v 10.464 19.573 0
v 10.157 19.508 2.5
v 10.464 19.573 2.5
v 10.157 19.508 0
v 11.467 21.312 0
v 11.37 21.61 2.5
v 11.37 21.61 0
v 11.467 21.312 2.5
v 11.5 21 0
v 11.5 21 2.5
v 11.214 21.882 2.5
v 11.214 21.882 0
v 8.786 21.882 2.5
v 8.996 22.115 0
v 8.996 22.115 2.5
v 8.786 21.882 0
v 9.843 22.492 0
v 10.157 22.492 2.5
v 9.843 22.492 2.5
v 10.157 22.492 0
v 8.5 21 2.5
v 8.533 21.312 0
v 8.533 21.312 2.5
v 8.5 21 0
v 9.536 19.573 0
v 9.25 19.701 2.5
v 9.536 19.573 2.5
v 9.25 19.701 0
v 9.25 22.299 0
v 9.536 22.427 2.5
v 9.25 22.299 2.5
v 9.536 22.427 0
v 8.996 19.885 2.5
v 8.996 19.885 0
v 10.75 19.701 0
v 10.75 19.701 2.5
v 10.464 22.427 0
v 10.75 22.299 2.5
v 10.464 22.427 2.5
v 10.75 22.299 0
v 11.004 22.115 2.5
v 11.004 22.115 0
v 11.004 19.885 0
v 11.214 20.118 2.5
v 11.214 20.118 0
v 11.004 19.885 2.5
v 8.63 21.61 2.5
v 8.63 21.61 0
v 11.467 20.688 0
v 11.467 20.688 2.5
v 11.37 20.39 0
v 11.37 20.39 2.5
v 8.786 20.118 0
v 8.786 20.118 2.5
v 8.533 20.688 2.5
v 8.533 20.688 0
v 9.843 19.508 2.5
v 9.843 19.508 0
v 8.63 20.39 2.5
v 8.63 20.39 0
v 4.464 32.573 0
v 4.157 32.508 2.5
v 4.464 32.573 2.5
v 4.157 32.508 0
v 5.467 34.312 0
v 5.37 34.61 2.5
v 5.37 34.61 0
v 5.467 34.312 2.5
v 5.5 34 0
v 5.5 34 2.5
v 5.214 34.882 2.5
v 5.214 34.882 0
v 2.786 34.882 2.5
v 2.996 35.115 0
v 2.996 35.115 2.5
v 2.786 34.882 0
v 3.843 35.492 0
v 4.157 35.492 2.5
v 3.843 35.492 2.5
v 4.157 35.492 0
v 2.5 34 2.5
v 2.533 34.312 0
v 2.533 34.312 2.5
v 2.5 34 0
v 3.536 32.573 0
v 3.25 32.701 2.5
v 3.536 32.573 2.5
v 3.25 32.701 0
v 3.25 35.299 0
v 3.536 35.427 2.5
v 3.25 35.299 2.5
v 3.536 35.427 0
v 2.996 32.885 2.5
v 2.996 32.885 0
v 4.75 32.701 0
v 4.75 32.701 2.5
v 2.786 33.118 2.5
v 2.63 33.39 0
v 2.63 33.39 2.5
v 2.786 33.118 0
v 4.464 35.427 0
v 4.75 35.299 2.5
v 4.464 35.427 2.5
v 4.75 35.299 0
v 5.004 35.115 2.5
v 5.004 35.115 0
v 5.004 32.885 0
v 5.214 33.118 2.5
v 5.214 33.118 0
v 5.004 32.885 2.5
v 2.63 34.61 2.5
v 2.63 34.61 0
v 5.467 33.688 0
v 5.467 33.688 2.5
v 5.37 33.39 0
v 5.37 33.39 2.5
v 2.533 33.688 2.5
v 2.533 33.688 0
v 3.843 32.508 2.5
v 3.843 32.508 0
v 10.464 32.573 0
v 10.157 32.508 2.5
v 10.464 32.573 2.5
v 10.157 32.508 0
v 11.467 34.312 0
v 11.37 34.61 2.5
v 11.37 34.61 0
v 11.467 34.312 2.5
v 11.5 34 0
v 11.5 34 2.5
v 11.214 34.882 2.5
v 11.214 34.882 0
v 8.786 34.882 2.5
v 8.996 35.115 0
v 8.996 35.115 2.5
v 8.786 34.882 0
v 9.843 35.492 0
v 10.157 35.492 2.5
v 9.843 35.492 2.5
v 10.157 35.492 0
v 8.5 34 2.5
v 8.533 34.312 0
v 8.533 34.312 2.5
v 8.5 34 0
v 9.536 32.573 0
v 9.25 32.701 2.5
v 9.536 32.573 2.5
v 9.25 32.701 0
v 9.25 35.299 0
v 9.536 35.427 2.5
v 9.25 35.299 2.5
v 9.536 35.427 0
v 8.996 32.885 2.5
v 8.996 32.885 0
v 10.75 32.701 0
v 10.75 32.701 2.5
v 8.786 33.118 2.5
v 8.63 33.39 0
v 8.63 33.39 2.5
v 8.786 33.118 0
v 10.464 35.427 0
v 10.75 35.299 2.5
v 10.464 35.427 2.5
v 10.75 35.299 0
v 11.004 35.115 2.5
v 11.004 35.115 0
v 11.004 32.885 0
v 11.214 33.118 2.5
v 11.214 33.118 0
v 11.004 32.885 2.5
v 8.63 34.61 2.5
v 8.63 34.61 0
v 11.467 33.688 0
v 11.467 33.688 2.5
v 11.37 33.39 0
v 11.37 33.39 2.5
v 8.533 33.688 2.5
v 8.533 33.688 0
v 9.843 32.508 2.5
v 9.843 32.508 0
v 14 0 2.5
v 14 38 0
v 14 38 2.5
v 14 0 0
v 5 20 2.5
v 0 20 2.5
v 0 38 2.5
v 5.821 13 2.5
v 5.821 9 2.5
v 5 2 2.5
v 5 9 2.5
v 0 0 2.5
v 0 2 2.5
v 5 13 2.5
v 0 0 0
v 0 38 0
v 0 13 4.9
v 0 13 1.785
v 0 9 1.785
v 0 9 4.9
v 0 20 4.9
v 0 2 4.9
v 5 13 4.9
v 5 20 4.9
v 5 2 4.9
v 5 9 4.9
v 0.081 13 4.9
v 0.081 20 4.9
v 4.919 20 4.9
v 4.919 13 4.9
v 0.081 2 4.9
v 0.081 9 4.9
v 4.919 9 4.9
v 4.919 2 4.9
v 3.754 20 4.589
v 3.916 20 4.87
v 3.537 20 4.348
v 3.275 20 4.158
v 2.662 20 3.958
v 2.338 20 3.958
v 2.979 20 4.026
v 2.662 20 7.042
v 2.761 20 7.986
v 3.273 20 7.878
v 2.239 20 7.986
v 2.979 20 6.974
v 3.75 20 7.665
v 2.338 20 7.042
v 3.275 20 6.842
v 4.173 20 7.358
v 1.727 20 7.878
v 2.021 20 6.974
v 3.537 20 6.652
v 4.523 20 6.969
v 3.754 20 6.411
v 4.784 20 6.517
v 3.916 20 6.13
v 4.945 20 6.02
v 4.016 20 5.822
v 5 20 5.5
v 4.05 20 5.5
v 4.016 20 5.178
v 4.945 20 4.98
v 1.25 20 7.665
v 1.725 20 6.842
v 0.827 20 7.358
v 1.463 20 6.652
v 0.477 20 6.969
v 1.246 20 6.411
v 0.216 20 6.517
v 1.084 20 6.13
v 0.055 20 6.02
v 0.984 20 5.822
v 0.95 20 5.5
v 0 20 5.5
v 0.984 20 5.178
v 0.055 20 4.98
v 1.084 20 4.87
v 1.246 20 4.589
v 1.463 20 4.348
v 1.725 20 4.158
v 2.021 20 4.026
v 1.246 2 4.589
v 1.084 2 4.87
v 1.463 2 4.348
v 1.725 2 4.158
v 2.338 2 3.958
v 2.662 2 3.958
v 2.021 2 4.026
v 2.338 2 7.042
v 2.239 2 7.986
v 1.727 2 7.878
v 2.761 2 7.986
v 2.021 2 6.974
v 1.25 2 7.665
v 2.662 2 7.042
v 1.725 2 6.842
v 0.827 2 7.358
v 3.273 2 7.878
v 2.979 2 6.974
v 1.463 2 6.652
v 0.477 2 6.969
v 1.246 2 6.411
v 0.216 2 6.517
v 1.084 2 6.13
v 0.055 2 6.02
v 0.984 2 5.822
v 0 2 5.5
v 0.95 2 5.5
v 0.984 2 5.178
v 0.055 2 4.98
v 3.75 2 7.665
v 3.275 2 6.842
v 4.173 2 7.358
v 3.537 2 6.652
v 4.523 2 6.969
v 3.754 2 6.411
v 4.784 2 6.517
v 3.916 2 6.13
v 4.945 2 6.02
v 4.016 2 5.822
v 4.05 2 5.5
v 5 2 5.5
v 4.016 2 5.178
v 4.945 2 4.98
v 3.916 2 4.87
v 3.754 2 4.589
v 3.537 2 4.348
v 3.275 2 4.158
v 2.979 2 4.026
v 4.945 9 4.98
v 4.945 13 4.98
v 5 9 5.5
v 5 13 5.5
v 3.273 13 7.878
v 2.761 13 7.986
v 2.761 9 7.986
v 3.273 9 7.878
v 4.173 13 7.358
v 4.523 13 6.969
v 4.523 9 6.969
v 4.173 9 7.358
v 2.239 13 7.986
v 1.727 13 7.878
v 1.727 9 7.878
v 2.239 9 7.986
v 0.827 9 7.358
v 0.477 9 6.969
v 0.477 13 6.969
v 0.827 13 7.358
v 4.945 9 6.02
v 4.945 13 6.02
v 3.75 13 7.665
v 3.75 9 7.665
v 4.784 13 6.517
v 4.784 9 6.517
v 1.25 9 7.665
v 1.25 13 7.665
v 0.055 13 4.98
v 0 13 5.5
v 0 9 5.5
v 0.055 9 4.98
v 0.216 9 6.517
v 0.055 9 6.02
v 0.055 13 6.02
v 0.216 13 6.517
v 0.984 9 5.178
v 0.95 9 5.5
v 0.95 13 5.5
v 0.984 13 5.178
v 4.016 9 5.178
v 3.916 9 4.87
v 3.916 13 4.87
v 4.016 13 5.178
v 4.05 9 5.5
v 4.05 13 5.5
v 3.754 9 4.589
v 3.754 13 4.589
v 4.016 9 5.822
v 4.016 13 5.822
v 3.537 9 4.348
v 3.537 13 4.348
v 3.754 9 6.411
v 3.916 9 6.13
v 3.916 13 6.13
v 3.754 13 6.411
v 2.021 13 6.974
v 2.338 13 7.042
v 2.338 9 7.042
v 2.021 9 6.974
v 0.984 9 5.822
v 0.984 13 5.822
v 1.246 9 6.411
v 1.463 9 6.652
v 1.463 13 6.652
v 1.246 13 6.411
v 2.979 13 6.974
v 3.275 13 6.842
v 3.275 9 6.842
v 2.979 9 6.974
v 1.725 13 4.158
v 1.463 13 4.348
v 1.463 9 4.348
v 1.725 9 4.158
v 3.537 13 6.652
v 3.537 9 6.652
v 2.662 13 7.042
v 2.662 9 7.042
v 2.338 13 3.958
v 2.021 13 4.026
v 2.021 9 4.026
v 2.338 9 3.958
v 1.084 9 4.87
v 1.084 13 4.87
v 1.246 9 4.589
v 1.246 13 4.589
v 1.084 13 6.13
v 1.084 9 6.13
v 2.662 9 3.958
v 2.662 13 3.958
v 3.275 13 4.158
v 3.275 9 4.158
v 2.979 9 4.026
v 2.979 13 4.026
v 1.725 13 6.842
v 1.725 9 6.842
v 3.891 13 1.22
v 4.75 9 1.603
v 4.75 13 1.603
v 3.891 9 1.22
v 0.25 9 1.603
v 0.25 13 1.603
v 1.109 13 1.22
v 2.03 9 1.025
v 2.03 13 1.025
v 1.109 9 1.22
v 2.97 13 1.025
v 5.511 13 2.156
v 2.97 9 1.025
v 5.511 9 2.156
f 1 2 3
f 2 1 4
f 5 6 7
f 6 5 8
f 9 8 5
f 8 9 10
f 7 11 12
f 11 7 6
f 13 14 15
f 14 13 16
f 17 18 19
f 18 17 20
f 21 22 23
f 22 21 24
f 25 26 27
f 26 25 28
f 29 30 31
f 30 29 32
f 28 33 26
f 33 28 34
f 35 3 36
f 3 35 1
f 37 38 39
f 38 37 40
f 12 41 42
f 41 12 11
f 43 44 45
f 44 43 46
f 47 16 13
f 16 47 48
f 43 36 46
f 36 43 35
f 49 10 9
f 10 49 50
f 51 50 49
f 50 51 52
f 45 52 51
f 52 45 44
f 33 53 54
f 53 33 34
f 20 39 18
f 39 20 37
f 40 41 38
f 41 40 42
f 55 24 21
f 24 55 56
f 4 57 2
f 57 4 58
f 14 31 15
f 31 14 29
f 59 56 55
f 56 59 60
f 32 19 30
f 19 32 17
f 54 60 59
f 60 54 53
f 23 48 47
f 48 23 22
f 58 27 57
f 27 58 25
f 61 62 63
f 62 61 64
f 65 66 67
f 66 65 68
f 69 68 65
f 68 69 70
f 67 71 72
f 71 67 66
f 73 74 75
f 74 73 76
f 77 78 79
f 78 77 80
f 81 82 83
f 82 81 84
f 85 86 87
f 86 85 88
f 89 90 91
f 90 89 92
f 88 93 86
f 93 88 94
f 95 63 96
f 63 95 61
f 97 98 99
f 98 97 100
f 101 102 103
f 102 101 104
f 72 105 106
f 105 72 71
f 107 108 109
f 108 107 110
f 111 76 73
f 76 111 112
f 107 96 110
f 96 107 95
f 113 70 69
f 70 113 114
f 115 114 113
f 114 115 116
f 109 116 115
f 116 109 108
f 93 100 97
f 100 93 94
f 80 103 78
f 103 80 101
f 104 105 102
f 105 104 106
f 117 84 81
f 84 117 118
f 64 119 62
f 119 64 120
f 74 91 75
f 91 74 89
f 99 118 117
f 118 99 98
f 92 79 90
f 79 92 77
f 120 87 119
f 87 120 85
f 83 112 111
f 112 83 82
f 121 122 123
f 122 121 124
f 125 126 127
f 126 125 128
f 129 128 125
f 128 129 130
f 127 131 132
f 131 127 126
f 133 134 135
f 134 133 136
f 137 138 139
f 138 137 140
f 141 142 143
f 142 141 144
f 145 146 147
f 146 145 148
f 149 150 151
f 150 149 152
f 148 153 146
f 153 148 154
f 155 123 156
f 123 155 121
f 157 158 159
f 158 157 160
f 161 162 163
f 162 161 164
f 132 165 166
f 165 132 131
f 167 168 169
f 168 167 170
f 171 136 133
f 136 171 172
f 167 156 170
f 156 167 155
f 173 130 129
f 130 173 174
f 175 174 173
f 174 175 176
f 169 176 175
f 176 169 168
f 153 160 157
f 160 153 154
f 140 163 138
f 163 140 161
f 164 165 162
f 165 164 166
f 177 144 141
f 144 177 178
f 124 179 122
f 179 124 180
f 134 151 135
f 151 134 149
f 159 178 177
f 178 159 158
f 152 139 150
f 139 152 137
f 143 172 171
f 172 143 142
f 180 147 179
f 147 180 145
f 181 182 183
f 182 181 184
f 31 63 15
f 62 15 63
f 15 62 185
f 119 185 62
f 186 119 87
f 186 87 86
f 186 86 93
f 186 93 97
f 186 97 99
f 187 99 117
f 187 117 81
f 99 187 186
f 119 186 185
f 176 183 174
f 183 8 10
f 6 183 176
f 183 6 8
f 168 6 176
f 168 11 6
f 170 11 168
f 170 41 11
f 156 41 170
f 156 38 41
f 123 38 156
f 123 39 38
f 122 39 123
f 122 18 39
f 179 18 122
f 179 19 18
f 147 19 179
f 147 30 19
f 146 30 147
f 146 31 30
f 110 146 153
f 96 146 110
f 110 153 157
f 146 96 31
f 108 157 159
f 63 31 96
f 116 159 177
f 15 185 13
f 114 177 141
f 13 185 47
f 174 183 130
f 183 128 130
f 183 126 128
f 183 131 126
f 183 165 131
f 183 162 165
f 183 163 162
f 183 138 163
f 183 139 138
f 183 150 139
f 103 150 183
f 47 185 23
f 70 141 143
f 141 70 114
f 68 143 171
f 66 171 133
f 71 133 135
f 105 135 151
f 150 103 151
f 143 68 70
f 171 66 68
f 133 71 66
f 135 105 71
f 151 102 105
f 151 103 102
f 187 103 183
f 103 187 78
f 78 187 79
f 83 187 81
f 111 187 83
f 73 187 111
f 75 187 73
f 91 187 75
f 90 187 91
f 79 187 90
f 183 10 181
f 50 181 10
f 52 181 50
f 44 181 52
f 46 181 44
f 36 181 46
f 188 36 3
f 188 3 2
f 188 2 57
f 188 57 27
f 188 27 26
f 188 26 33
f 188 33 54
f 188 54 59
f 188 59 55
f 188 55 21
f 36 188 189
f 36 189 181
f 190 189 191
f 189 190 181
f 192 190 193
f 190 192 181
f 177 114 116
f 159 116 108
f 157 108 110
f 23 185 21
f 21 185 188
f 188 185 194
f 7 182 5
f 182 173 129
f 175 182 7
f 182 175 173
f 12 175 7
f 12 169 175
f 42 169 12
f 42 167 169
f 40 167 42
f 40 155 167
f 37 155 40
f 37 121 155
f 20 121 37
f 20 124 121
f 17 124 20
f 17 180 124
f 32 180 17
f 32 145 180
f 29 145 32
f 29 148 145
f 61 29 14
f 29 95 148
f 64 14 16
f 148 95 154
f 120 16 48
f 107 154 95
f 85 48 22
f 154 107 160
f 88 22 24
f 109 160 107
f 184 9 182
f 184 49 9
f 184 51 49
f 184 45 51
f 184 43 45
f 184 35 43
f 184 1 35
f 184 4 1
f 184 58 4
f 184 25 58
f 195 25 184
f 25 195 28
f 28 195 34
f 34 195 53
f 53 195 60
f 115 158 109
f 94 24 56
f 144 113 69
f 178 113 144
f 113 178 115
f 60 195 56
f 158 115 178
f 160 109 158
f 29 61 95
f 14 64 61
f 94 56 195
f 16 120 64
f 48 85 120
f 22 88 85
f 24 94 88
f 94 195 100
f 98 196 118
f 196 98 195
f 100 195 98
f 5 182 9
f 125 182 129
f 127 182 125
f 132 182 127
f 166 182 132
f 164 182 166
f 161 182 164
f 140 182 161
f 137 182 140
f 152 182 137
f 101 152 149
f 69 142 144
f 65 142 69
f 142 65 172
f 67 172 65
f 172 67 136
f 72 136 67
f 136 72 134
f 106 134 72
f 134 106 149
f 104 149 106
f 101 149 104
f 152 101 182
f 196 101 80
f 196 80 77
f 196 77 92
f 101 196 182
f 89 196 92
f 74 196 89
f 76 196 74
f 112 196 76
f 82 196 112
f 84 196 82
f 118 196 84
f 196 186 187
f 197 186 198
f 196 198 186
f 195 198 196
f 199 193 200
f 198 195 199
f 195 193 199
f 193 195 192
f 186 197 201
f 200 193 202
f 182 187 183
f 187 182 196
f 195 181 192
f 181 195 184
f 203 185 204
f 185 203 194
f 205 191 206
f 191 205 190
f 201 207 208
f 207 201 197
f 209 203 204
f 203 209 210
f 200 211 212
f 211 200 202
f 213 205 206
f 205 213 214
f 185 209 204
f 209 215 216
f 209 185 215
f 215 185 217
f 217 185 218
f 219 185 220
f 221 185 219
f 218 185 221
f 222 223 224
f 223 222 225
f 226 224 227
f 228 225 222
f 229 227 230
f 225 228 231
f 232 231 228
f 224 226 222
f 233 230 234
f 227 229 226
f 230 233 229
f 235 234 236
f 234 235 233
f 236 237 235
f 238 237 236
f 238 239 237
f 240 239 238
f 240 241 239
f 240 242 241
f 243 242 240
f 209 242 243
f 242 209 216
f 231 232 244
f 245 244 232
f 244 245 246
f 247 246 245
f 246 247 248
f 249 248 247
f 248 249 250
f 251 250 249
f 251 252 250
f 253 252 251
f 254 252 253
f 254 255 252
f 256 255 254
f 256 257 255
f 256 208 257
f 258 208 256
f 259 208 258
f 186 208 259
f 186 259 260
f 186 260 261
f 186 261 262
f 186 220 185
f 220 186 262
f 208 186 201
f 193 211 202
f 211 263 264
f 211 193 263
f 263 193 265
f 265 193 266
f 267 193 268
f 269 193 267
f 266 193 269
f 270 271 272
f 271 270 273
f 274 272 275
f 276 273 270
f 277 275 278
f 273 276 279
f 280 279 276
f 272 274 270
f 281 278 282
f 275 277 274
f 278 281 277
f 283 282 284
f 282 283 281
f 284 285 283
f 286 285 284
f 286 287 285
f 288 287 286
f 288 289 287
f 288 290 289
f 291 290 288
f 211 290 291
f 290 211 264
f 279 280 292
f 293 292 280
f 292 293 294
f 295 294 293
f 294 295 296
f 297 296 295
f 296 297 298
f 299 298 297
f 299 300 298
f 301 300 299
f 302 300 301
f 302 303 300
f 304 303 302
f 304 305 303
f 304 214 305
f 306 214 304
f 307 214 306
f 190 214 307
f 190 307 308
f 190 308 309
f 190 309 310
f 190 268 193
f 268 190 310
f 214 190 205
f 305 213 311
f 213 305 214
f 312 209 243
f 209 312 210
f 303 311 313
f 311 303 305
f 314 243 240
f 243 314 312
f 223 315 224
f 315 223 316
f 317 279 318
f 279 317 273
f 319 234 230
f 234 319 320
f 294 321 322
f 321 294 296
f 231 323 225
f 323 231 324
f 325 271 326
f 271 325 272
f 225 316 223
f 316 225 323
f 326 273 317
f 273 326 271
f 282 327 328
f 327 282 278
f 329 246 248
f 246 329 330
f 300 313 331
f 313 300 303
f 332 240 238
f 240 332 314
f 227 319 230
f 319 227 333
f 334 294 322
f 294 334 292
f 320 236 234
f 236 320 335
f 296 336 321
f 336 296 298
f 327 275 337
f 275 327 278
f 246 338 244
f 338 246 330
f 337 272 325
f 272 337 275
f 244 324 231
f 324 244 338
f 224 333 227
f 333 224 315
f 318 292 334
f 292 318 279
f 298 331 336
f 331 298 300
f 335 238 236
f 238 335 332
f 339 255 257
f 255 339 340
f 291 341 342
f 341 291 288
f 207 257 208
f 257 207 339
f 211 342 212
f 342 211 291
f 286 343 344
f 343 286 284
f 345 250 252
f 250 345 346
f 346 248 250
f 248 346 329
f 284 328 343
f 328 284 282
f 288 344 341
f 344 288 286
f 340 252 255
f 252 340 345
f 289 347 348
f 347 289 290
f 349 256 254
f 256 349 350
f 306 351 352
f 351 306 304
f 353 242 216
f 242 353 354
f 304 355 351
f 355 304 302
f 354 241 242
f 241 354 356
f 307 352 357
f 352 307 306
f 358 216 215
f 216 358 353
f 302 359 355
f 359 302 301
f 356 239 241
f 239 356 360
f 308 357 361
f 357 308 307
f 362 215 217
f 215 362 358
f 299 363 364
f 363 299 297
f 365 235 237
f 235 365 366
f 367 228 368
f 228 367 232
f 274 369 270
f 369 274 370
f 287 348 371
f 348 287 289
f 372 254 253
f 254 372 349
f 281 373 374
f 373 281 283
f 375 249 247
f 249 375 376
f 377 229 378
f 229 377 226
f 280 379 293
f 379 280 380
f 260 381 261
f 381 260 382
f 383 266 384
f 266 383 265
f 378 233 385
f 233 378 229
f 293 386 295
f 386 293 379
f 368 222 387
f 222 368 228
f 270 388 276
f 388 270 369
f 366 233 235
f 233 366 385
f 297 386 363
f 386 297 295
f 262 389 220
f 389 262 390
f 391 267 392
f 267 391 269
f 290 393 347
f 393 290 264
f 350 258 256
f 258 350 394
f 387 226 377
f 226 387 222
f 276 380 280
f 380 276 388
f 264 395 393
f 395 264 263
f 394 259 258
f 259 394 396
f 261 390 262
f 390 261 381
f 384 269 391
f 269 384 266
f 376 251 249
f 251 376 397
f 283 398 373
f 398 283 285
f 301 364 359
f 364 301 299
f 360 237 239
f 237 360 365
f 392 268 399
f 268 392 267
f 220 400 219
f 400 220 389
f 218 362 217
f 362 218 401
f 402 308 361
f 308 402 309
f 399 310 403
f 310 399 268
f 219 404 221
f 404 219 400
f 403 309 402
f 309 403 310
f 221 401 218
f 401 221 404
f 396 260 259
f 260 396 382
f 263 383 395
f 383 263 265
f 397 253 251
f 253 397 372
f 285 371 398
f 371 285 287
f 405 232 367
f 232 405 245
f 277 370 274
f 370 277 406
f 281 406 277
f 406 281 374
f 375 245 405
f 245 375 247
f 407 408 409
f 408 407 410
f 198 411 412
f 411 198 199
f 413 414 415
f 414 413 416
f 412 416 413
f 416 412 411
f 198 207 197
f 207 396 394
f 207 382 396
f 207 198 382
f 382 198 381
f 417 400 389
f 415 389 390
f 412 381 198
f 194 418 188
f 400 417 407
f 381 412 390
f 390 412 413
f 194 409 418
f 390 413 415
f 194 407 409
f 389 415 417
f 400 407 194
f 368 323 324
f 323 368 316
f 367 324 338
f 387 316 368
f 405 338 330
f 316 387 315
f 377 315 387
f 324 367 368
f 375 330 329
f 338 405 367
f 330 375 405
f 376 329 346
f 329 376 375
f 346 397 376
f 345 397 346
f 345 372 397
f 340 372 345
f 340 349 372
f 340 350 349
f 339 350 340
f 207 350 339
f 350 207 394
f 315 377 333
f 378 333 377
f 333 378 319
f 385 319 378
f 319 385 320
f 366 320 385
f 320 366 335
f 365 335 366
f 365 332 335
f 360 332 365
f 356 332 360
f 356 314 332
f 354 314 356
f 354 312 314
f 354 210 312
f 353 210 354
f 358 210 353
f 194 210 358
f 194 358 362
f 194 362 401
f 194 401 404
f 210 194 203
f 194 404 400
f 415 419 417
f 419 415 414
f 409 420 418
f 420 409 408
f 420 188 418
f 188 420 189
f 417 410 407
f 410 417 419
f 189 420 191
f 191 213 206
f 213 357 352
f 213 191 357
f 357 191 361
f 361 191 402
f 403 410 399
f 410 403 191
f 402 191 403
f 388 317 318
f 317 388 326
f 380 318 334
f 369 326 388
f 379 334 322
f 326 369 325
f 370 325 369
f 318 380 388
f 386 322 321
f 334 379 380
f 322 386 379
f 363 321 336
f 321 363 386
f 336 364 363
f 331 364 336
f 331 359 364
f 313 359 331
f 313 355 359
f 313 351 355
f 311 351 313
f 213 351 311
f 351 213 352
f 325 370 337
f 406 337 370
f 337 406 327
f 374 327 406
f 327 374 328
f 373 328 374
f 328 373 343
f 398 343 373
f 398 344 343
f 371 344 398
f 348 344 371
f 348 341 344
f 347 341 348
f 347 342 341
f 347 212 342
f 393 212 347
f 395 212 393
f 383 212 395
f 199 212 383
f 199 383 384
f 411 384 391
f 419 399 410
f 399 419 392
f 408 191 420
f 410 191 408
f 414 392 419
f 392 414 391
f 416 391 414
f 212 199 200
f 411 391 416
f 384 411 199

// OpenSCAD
$fn=30;
hauteur_roulement=9-4+0.5;
longueur_axe=22-2*2;

module support()
{
    translate([0,2,2-0.1])
        cube([5,longueur_axe,3]);
    difference()
    {
        cube([14,longueur_axe+20,2.5]);
        union()
        {
            
            translate([10,21,-0.1]) cylinder(d=3,h=3.2);
            translate([4,34,-0.1]) cylinder(d=3,h=3.2);
            translate([10,34,-0.1]) cylinder(d=3,h=3.2);
        }
    }

}

module cylindre_h(diametre,longueur)
{
    translate([2.5,2,hauteur_roulement])
    rotate([-90,0,0])
        cylinder(d=diametre,h=longueur);
}

difference()
{
    union()
    {
        support();
        cylindre_h(3+2,longueur_axe);
    }
    cylindre_h(3.1,longueur_axe);
    translate([0,longueur_axe/2-2,0]) cylindre_h(9,4);
}
